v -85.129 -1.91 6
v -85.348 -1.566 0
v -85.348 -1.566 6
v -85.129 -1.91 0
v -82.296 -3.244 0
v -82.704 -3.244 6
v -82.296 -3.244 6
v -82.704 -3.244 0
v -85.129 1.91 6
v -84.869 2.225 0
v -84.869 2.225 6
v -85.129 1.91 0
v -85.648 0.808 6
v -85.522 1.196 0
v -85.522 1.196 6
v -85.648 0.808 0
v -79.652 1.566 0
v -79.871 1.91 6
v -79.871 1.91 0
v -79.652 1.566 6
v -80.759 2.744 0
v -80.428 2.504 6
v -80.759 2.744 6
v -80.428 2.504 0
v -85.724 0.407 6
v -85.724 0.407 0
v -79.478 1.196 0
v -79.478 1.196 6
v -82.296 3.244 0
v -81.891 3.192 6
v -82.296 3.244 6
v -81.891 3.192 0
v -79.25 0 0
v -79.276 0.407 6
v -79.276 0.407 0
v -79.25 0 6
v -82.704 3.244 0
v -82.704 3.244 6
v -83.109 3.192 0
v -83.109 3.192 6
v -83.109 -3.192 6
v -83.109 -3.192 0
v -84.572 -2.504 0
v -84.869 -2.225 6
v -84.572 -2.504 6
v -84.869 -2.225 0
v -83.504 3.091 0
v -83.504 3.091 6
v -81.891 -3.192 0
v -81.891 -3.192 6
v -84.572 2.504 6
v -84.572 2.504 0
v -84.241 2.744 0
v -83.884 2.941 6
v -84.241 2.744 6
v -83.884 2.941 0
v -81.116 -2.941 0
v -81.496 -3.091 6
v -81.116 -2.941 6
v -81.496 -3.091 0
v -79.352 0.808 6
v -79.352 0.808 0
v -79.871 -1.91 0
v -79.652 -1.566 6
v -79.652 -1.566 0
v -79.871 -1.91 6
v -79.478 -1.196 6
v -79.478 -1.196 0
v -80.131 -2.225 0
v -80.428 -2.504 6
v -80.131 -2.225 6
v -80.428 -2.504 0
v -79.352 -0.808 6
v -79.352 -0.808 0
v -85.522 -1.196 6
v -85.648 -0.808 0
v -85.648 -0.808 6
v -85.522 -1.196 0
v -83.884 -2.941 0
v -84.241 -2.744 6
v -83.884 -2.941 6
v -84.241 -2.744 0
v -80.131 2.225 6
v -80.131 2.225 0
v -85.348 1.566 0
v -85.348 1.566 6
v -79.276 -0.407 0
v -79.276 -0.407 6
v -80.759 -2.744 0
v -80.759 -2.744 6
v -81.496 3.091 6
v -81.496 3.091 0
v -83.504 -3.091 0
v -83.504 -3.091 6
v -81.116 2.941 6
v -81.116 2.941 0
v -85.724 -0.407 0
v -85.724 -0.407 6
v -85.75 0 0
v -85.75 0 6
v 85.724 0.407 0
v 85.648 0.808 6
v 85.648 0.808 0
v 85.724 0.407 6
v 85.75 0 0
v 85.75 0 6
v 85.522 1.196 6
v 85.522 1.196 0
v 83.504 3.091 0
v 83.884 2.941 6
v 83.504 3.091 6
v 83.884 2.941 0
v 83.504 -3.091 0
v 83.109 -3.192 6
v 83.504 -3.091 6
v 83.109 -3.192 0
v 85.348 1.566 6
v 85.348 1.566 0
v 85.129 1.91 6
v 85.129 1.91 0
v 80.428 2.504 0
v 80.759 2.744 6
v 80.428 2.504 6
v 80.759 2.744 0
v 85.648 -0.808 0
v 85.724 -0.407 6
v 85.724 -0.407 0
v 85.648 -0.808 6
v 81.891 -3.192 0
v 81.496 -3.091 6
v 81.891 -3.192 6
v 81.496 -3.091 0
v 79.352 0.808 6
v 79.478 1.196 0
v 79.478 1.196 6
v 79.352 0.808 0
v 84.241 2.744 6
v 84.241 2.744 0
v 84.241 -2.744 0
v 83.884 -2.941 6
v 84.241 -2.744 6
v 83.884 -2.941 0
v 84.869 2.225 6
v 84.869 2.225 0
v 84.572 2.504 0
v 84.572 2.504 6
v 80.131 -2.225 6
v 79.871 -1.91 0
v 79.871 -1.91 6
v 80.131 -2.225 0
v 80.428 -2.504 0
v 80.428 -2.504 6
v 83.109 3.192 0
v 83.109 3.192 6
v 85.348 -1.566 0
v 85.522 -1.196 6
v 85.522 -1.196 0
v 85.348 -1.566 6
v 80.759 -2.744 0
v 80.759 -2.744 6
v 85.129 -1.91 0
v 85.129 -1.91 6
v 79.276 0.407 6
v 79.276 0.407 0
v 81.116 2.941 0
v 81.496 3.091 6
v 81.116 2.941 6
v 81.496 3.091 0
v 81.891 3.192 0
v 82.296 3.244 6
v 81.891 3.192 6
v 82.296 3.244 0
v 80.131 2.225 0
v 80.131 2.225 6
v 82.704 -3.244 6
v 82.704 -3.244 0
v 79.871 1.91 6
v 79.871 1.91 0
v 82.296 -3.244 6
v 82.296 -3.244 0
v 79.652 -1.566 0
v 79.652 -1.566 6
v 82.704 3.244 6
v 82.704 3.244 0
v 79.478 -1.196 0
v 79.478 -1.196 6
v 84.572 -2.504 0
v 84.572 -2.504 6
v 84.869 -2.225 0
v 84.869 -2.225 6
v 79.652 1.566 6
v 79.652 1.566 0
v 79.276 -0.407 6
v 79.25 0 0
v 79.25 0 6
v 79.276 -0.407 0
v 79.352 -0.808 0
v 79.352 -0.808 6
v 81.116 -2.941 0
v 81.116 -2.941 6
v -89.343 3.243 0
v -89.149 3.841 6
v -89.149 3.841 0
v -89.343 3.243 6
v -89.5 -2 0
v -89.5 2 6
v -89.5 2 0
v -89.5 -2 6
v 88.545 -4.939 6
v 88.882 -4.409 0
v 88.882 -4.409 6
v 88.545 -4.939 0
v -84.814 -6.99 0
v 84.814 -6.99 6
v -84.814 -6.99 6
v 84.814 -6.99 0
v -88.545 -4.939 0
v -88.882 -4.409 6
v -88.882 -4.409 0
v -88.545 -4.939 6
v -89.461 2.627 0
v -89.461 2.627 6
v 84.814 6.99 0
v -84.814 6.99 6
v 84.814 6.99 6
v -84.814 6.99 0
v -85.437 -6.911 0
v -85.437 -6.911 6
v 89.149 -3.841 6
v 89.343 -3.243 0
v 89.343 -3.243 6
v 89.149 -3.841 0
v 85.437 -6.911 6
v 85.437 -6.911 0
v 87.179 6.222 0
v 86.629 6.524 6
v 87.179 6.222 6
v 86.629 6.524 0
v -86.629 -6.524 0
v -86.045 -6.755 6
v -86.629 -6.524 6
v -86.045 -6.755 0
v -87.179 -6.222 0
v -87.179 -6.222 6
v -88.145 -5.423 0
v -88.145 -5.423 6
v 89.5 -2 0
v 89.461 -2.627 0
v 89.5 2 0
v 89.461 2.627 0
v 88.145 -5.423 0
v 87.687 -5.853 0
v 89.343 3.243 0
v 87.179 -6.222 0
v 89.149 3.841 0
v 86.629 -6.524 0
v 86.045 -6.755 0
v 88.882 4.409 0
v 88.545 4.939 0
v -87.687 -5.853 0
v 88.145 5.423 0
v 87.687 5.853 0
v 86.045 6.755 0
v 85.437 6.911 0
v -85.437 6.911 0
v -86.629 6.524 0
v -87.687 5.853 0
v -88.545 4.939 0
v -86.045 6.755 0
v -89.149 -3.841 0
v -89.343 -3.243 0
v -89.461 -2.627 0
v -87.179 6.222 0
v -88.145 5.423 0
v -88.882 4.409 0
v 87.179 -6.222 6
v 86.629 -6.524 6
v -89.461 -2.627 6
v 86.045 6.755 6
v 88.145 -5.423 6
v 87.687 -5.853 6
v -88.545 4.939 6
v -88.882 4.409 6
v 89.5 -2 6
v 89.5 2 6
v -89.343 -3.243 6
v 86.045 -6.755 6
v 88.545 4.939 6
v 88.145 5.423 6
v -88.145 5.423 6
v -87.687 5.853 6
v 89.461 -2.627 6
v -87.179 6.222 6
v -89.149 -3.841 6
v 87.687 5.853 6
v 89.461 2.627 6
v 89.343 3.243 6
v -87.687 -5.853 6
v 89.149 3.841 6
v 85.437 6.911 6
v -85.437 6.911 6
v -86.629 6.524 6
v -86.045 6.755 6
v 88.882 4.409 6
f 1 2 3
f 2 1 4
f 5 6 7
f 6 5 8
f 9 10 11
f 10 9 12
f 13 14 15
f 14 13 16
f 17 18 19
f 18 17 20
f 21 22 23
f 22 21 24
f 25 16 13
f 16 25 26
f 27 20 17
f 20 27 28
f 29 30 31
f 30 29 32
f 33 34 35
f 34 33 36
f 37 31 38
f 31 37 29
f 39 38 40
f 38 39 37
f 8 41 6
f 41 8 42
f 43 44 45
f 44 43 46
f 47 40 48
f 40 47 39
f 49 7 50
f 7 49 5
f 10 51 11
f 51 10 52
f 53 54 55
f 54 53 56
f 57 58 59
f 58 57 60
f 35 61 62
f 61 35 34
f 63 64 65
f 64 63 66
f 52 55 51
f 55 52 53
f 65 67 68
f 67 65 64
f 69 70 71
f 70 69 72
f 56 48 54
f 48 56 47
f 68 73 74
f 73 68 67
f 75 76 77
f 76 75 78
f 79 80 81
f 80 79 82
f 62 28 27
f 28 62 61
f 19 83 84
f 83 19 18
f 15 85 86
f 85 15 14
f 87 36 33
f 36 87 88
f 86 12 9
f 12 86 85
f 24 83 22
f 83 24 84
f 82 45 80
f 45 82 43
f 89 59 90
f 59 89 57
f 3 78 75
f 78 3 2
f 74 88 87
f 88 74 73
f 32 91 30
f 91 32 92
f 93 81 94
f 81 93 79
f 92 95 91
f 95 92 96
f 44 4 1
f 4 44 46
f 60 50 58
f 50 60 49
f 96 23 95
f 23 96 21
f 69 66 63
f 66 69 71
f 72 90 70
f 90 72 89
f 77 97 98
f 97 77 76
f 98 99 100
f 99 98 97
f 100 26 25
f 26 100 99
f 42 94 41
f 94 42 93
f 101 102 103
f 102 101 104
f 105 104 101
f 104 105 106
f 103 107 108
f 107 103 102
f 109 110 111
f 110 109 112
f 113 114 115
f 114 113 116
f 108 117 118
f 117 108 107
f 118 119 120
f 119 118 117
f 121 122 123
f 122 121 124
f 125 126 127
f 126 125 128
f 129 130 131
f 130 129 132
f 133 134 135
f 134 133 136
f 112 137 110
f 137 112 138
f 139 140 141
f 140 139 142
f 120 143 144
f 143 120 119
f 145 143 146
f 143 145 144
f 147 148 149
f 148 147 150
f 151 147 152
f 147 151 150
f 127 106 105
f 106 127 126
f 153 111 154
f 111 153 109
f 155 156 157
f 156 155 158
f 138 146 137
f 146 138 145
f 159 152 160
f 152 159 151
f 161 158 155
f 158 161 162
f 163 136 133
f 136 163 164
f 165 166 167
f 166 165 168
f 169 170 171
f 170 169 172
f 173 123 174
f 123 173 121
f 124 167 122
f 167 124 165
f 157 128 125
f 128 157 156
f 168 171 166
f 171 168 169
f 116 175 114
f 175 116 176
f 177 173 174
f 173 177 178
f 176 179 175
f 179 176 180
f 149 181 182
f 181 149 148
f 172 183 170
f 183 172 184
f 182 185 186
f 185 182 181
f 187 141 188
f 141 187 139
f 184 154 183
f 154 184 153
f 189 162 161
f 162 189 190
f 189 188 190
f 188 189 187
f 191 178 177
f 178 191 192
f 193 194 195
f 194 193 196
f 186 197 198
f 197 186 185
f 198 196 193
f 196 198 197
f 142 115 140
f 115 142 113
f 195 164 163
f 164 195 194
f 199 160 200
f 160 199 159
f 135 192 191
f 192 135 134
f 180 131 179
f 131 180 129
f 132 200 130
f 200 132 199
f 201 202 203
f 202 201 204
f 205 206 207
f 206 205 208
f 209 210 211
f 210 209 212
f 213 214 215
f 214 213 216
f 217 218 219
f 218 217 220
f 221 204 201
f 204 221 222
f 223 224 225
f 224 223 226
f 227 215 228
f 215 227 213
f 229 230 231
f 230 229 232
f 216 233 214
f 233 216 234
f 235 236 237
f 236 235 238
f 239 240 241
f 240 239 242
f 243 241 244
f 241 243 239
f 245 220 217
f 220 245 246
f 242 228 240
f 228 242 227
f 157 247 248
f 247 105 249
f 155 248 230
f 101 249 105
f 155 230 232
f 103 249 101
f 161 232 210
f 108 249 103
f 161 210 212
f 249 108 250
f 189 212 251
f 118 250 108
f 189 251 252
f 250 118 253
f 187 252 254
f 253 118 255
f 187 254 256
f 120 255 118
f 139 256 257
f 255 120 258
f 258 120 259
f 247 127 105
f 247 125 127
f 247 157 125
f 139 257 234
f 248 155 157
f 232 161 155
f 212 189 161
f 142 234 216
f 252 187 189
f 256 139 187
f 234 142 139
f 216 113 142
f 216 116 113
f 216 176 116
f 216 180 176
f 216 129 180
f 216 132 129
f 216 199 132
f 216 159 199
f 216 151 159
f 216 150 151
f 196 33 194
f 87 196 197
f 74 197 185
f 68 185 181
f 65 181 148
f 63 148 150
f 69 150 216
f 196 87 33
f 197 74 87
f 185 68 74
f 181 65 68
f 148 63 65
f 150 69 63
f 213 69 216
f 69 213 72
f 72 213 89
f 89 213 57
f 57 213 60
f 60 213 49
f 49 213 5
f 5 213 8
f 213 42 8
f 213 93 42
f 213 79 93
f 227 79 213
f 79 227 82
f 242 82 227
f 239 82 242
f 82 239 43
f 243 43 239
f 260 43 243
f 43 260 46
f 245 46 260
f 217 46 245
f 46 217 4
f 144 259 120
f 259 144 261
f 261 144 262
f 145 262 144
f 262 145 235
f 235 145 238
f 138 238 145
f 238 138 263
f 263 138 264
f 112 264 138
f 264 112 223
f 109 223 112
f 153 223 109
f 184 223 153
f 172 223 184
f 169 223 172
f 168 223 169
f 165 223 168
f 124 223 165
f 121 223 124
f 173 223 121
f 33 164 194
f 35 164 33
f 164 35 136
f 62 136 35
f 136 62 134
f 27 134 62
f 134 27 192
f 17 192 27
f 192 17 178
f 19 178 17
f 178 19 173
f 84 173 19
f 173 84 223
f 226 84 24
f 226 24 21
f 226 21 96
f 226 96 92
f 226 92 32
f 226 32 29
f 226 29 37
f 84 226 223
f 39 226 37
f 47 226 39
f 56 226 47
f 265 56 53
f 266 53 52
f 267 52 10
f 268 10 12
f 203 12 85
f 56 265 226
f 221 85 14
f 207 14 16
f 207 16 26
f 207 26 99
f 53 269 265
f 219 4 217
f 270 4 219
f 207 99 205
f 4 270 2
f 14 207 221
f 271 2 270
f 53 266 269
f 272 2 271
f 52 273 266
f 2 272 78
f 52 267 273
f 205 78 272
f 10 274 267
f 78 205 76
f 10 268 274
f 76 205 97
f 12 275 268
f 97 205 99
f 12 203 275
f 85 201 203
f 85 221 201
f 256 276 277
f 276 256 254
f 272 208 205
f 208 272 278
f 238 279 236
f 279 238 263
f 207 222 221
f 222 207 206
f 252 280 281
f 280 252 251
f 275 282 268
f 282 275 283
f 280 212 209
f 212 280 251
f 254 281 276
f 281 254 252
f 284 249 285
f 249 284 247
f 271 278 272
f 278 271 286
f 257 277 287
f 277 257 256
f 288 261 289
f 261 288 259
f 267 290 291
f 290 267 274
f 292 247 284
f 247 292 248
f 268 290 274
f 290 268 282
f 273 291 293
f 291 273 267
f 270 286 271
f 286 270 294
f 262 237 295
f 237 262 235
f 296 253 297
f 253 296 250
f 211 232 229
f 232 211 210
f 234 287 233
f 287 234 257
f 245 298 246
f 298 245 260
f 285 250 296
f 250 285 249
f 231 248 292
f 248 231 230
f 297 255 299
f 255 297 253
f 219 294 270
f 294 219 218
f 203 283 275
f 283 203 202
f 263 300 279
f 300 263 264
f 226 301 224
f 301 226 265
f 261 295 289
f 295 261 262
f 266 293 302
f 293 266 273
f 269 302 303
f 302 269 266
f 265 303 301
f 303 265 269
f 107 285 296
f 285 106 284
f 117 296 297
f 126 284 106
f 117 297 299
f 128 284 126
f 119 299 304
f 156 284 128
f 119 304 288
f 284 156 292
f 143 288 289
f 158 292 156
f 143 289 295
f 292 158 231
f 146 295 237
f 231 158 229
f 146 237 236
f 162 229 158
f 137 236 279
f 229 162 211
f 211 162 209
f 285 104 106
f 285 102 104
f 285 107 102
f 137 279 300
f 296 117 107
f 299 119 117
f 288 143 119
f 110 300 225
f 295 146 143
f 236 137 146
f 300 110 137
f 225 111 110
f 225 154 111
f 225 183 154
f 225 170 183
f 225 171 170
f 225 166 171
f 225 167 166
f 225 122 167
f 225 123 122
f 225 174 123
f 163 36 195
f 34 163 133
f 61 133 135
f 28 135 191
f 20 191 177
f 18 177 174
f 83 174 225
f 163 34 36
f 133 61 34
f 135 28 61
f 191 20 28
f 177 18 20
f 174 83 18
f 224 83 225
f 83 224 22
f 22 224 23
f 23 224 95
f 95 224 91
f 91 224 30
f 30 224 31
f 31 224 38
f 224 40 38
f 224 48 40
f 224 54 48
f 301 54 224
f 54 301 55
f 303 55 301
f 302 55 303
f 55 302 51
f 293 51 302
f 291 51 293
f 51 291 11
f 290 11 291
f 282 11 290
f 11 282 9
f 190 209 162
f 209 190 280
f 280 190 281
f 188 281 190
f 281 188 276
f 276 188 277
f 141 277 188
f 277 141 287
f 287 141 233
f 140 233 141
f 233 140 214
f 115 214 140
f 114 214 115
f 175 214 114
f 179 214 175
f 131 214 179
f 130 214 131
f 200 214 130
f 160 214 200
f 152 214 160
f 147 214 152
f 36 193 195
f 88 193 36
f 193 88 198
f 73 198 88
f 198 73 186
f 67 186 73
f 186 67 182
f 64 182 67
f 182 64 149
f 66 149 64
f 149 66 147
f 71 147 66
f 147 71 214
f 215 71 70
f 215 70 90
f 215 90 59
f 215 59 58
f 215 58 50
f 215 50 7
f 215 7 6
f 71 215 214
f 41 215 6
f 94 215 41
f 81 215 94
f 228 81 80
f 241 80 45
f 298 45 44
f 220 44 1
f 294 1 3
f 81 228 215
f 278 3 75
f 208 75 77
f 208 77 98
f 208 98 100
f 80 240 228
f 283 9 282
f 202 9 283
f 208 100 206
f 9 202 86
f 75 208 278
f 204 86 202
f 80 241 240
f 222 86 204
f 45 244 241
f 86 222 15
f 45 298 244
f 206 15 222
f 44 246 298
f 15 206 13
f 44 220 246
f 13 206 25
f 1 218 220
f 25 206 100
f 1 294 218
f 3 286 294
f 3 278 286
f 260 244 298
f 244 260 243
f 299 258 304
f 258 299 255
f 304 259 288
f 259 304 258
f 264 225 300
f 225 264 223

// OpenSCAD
$fn = 50;


difference() {
	union() {
		hull() {
			translate(v = [-84.5000000000, 2.0000000000, 0]) {
				cylinder(h = 6, r = 5);
			}
			translate(v = [84.5000000000, 2.0000000000, 0]) {
				cylinder(h = 6, r = 5);
			}
			translate(v = [-84.5000000000, -2.0000000000, 0]) {
				cylinder(h = 6, r = 5);
			}
			translate(v = [84.5000000000, -2.0000000000, 0]) {
				cylinder(h = 6, r = 5);
			}
		}
	}
	union() {
		translate(v = [-82.5000000000, 0.0000000000, -100.0000000000]) {
			cylinder(h = 200, r = 3.2500000000);
		}
		translate(v = [-82.5000000000, 0.0000000000, -100.0000000000]) {
			cylinder(h = 200, r = 3.2500000000);
		}
		translate(v = [82.5000000000, 0.0000000000, -100.0000000000]) {
			cylinder(h = 200, r = 3.2500000000);
		}
		translate(v = [82.5000000000, 0.0000000000, -100.0000000000]) {
			cylinder(h = 200, r = 3.2500000000);
		}
	}
}
